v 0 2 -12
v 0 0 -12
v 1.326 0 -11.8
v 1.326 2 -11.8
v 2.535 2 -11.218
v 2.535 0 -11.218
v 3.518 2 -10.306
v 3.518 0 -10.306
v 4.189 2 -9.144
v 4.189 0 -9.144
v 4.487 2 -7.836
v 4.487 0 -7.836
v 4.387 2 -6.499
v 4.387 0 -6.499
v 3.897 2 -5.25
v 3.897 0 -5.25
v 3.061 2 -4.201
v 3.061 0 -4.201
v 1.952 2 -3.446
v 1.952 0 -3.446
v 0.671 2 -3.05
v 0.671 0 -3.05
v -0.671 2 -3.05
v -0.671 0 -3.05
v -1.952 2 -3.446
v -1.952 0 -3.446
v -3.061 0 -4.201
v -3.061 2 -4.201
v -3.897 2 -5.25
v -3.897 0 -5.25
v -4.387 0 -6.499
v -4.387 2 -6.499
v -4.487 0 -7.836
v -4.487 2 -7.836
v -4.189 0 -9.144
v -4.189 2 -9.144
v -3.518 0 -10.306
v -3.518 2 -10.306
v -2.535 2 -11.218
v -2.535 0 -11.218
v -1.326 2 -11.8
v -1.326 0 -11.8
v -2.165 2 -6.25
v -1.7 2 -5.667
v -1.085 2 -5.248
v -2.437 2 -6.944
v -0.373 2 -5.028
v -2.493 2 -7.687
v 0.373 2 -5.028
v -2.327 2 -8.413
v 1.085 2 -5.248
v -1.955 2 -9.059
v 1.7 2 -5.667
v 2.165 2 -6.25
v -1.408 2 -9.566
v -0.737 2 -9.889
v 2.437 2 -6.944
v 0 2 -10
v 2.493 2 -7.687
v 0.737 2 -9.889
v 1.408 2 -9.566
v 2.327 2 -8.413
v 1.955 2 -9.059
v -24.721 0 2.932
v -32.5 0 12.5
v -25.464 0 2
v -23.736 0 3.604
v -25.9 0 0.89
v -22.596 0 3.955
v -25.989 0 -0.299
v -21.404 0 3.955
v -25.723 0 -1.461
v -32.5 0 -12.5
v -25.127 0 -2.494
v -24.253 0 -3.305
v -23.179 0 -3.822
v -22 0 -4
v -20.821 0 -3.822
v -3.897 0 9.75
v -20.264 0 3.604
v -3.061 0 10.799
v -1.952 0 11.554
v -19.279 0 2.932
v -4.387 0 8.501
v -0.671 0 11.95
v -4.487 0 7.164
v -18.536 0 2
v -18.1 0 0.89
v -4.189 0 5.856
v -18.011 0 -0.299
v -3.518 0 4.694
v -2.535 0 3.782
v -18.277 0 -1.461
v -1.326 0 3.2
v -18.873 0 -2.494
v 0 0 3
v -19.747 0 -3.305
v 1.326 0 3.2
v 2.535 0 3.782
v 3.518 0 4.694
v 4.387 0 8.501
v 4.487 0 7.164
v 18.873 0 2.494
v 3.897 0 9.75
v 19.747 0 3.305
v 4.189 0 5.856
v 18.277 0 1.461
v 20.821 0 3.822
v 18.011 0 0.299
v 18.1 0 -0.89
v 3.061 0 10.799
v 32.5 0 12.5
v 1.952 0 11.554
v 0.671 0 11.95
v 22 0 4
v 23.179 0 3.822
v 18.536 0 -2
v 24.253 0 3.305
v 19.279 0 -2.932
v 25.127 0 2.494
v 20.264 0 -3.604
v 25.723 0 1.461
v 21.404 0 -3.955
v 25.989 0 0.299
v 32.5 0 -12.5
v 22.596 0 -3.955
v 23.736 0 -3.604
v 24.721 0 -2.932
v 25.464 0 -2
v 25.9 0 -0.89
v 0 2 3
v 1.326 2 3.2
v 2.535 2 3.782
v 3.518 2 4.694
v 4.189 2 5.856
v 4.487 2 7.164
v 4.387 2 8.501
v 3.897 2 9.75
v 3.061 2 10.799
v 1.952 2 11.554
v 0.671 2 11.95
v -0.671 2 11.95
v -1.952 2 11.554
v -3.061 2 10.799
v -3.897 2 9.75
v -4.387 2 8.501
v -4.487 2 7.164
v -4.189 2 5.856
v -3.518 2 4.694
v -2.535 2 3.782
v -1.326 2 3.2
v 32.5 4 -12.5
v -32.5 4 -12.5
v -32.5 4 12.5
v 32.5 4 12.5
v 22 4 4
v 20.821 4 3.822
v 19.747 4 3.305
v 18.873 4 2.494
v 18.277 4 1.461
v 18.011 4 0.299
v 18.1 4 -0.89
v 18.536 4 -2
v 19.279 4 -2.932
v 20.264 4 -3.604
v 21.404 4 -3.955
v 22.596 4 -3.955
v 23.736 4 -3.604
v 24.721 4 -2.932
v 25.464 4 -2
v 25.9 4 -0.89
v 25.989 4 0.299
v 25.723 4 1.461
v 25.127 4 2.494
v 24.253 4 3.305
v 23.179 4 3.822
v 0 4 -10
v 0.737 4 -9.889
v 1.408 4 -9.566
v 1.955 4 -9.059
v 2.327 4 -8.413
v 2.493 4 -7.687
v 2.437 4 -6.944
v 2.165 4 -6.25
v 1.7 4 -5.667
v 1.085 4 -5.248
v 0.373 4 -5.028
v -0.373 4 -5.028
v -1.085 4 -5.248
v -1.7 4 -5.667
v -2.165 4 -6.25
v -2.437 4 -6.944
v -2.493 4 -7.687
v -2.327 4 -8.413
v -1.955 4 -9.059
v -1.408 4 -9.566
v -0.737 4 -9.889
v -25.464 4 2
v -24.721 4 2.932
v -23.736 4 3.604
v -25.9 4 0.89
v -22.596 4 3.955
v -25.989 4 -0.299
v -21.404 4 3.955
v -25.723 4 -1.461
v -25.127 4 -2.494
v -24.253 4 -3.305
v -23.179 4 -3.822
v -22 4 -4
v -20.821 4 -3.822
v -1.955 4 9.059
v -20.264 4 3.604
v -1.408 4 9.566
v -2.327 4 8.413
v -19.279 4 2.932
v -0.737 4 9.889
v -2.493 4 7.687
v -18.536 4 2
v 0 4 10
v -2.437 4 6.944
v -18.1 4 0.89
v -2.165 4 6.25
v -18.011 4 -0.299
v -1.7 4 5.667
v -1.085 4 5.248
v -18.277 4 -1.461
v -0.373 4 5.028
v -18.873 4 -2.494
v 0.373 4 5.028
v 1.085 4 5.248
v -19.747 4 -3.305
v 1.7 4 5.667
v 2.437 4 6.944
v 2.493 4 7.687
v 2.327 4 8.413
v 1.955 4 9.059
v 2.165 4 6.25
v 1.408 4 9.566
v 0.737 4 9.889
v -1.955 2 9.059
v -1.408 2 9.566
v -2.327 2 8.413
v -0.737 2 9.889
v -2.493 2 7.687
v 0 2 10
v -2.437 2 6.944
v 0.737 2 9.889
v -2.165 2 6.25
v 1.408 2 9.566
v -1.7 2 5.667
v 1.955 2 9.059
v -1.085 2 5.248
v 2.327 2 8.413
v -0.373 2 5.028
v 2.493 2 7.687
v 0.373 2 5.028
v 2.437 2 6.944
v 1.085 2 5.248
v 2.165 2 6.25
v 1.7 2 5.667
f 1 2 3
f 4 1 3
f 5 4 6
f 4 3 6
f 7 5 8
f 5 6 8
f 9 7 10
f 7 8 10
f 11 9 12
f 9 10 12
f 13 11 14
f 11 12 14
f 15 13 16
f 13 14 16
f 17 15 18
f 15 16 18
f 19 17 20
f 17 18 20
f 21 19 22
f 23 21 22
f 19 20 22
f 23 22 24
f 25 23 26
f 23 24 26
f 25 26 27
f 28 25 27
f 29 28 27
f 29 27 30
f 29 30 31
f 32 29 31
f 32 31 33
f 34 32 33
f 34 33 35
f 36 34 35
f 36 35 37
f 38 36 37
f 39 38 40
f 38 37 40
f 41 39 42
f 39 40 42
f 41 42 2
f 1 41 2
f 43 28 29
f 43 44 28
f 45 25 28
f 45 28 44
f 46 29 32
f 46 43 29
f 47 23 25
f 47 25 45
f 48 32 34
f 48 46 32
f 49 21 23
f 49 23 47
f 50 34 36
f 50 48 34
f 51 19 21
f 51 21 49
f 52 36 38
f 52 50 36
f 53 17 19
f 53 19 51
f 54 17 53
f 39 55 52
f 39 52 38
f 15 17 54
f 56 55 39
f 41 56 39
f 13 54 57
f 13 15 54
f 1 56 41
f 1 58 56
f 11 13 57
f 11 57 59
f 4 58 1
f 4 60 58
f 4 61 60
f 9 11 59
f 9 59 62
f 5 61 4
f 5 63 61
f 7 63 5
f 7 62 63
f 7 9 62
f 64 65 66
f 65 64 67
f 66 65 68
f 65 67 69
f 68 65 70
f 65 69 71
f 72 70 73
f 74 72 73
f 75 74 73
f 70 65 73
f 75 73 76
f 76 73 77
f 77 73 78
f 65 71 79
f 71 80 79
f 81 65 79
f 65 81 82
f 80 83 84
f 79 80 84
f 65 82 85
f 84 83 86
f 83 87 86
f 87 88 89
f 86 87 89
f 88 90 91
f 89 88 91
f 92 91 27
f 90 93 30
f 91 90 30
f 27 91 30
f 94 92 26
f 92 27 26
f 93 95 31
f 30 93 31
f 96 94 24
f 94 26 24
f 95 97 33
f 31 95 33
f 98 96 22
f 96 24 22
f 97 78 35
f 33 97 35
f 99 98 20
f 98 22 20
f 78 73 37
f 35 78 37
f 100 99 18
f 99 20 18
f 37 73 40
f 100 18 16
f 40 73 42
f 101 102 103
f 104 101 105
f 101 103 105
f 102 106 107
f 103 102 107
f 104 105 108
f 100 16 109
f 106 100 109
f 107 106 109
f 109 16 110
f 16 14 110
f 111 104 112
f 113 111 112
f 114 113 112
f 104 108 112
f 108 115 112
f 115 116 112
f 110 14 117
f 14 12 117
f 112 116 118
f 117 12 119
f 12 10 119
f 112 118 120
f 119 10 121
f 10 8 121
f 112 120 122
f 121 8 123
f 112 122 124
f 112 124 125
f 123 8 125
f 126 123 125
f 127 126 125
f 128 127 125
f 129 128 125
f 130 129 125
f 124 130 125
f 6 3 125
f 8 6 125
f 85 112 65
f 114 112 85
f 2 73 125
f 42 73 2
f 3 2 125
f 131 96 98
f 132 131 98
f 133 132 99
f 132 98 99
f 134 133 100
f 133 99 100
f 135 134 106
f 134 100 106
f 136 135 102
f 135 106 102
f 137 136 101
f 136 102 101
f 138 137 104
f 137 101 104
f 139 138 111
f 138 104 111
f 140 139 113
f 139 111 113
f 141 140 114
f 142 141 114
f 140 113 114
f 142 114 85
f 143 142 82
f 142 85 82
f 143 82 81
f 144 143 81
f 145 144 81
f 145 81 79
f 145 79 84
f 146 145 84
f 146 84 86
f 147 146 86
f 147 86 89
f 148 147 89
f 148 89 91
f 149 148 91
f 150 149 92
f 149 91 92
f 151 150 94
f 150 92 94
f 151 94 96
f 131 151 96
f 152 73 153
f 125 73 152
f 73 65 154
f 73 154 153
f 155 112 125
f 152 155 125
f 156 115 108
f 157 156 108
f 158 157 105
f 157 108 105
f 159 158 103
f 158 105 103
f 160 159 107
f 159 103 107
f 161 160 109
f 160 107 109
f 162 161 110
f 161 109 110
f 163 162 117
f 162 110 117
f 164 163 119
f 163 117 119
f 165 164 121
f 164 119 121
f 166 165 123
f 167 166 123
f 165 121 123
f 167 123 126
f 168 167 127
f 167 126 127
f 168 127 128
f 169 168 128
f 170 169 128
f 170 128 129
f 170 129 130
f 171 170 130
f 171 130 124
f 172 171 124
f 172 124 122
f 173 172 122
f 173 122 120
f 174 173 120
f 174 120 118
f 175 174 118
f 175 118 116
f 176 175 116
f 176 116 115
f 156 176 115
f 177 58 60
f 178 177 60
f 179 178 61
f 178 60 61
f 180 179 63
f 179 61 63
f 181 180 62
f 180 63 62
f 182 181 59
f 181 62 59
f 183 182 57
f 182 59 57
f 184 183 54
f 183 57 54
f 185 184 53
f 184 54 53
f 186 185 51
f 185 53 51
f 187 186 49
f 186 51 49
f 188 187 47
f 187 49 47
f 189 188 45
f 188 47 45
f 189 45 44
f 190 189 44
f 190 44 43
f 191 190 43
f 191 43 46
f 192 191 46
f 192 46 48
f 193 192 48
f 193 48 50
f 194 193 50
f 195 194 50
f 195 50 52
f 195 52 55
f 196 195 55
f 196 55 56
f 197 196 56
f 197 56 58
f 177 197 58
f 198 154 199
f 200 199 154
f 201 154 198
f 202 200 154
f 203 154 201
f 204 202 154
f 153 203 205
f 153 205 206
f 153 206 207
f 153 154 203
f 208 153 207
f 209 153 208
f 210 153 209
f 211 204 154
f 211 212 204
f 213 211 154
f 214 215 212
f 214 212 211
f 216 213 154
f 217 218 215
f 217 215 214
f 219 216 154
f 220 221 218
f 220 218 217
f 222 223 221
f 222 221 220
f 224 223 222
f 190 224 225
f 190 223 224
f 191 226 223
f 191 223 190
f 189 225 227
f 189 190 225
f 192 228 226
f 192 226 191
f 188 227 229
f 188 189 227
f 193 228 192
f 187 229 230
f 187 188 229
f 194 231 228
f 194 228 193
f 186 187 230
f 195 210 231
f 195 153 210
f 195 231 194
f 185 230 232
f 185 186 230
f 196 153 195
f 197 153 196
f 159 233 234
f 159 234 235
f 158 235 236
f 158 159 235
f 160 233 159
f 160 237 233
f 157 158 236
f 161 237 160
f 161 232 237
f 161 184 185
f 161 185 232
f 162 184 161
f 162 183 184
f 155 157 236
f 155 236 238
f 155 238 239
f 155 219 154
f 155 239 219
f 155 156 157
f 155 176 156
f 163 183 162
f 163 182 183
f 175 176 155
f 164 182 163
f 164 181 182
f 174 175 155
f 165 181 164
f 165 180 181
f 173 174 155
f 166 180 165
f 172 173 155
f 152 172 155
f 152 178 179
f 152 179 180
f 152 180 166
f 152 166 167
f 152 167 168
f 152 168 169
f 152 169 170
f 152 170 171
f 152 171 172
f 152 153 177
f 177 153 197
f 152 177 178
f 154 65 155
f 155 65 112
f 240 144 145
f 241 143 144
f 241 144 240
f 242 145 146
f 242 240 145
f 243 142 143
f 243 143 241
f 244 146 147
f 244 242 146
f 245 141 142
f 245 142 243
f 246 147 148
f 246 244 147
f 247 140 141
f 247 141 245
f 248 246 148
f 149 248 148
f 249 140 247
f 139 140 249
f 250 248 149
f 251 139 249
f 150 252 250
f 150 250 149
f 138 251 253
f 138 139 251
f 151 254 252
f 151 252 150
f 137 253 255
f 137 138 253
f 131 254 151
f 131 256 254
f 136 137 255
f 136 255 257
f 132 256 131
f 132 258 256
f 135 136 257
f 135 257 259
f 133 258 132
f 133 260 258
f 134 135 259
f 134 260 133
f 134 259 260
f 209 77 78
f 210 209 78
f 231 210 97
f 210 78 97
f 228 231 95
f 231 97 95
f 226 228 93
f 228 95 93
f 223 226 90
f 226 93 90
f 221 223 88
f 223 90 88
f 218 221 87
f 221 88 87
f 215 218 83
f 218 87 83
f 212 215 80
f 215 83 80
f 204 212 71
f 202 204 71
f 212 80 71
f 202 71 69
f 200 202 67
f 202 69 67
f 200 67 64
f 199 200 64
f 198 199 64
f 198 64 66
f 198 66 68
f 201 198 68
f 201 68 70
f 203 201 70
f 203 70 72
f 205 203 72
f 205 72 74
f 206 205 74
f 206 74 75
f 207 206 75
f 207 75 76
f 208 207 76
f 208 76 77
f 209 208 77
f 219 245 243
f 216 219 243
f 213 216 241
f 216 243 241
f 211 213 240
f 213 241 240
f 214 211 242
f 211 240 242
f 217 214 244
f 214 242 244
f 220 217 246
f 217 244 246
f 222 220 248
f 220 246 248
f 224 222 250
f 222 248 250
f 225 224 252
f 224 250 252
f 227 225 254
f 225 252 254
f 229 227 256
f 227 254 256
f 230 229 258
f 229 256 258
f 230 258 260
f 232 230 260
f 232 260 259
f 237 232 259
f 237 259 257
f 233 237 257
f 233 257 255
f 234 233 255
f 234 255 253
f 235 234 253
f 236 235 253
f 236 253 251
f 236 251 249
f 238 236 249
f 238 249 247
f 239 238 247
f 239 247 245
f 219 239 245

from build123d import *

# Parameters (mm, degrees)
SKETCH_1_W          = 65
SKETCH_1_H          = 25
EXTRUDE_1_DEPTH     = 4
SKETCH_2_W          = 15
SKETCH_2_H          = 25
EXTRUDE_2_DEPTH     = 13
SKETCH_3_R          = 2.5
SKETCH_3_R_2        = 4
CUT_EXTRUDE_1_DEPTH = 39.74919354
SKETCH_4_R          = 4.5
CUT_EXTRUDE_2_DEPTH = 2
SKETCH_5_W          = 15
SKETCH_5_H          = 4
EXTRUDE_3_DEPTH     = 6
SKETCH_6_R          = 1.25
CUT_EXTRUDE_3_DEPTH = 40.59166579
FILLET_2_R          = 3
SKETCH_9_W          = 15
SKETCH_9_H          = 13
CUT_EXTRUDE_4_DEPTH = 53.098464469


with BuildPart() as part:
    # 草图1 → 凸台-拉伸1 (new body)
    with BuildSketch(Plane(origin=(0, 0, 0), x_dir=(1, 0, 0), z_dir=(0, 1, 0))):
        Rectangle(SKETCH_1_W, SKETCH_1_H)
    extrude(amount=EXTRUDE_1_DEPTH)

    # 草图2 → 凸台-拉伸2 (add)
    with BuildSketch(Plane(origin=(0, 4, 0), x_dir=(1, 0, 0), z_dir=(0, 1, 0))):
        Rectangle(SKETCH_2_W, SKETCH_2_H)
    extrude(amount=EXTRUDE_2_DEPTH)

    # 草图3 → 切除-拉伸1 (cut, through all)
    with BuildSketch(Plane.XZ):
        with Locations(Location((0, -7.5, 0), (0, 0, 270))):
            Circle(SKETCH_3_R)
        with Locations(Location((0, 7.5, 0), (0, 0, 90))):
            Circle(SKETCH_3_R)
        with Locations(Location((-22, 0, 0), (0, 0, 270))):
            Circle(SKETCH_3_R_2)
        with Locations(Location((22, 0, 0), (0, 0, 90))):
            Circle(SKETCH_3_R_2)
    extrude(amount=-CUT_EXTRUDE_1_DEPTH, mode=Mode.SUBTRACT)

    # 草图4 → 切除-拉伸2 (cut)
    with BuildSketch(Plane.XZ):
        with Locations(Location((0, -7.5, 0), (0, 0, 270))):
            Circle(SKETCH_4_R)
        with Locations(Location((0, 7.5, 0), (0, 0, 270))):
            Circle(SKETCH_4_R)
    extrude(amount=-CUT_EXTRUDE_2_DEPTH, mode=Mode.SUBTRACT)

    # 草图5 → 凸台-拉伸3 (add)
    with BuildSketch(Plane.XY.offset(12.5)):
        with Locations((0, 6)):
            Rectangle(SKETCH_5_W, SKETCH_5_H)
    extrude_3 = extrude(amount=EXTRUDE_3_DEPTH)

    # 草图6 → 切除-拉伸3 (cut, through all)
    with BuildSketch(Plane.XZ.offset(-4)):
        with Locations(Location((-4.5, 15.5, 0), (0, 0, 270))):
            Circle(SKETCH_6_R)
        with Locations(Location((4.5, 15.5, 0), (0, 0, 270))):
            Circle(SKETCH_6_R)
    cut_extrude_3 = extrude(amount=-CUT_EXTRUDE_3_DEPTH, mode=Mode.SUBTRACT)

    # 镜向2: 凸台-拉伸3, 切除-拉伸3 across plane
    add(extrude_3.mirror(Plane.XY))
    add(cut_extrude_3.mirror(Plane.XY), mode=Mode.SUBTRACT)

    # 圆角2
    fillet_2_edges = [part.edges().sort_by_distance(p)[0] for p in [
        (-7.5, 6, 18.5),
        (7.5, 6, 18.5),
        (-7.5, 6, -18.5),
        (7.5, 6, -18.5),
    ]]
    fillet(fillet_2_edges, radius=FILLET_2_R)

    # 草图9 → 切除-拉伸4 (cut, through all)
    with BuildSketch(Plane.XY.offset(18.5)):
        with Locations((0, 10.5)):
            Rectangle(SKETCH_9_W, SKETCH_9_H)
    extrude(amount=-CUT_EXTRUDE_4_DEPTH, mode=Mode.SUBTRACT)


solid = part.part
